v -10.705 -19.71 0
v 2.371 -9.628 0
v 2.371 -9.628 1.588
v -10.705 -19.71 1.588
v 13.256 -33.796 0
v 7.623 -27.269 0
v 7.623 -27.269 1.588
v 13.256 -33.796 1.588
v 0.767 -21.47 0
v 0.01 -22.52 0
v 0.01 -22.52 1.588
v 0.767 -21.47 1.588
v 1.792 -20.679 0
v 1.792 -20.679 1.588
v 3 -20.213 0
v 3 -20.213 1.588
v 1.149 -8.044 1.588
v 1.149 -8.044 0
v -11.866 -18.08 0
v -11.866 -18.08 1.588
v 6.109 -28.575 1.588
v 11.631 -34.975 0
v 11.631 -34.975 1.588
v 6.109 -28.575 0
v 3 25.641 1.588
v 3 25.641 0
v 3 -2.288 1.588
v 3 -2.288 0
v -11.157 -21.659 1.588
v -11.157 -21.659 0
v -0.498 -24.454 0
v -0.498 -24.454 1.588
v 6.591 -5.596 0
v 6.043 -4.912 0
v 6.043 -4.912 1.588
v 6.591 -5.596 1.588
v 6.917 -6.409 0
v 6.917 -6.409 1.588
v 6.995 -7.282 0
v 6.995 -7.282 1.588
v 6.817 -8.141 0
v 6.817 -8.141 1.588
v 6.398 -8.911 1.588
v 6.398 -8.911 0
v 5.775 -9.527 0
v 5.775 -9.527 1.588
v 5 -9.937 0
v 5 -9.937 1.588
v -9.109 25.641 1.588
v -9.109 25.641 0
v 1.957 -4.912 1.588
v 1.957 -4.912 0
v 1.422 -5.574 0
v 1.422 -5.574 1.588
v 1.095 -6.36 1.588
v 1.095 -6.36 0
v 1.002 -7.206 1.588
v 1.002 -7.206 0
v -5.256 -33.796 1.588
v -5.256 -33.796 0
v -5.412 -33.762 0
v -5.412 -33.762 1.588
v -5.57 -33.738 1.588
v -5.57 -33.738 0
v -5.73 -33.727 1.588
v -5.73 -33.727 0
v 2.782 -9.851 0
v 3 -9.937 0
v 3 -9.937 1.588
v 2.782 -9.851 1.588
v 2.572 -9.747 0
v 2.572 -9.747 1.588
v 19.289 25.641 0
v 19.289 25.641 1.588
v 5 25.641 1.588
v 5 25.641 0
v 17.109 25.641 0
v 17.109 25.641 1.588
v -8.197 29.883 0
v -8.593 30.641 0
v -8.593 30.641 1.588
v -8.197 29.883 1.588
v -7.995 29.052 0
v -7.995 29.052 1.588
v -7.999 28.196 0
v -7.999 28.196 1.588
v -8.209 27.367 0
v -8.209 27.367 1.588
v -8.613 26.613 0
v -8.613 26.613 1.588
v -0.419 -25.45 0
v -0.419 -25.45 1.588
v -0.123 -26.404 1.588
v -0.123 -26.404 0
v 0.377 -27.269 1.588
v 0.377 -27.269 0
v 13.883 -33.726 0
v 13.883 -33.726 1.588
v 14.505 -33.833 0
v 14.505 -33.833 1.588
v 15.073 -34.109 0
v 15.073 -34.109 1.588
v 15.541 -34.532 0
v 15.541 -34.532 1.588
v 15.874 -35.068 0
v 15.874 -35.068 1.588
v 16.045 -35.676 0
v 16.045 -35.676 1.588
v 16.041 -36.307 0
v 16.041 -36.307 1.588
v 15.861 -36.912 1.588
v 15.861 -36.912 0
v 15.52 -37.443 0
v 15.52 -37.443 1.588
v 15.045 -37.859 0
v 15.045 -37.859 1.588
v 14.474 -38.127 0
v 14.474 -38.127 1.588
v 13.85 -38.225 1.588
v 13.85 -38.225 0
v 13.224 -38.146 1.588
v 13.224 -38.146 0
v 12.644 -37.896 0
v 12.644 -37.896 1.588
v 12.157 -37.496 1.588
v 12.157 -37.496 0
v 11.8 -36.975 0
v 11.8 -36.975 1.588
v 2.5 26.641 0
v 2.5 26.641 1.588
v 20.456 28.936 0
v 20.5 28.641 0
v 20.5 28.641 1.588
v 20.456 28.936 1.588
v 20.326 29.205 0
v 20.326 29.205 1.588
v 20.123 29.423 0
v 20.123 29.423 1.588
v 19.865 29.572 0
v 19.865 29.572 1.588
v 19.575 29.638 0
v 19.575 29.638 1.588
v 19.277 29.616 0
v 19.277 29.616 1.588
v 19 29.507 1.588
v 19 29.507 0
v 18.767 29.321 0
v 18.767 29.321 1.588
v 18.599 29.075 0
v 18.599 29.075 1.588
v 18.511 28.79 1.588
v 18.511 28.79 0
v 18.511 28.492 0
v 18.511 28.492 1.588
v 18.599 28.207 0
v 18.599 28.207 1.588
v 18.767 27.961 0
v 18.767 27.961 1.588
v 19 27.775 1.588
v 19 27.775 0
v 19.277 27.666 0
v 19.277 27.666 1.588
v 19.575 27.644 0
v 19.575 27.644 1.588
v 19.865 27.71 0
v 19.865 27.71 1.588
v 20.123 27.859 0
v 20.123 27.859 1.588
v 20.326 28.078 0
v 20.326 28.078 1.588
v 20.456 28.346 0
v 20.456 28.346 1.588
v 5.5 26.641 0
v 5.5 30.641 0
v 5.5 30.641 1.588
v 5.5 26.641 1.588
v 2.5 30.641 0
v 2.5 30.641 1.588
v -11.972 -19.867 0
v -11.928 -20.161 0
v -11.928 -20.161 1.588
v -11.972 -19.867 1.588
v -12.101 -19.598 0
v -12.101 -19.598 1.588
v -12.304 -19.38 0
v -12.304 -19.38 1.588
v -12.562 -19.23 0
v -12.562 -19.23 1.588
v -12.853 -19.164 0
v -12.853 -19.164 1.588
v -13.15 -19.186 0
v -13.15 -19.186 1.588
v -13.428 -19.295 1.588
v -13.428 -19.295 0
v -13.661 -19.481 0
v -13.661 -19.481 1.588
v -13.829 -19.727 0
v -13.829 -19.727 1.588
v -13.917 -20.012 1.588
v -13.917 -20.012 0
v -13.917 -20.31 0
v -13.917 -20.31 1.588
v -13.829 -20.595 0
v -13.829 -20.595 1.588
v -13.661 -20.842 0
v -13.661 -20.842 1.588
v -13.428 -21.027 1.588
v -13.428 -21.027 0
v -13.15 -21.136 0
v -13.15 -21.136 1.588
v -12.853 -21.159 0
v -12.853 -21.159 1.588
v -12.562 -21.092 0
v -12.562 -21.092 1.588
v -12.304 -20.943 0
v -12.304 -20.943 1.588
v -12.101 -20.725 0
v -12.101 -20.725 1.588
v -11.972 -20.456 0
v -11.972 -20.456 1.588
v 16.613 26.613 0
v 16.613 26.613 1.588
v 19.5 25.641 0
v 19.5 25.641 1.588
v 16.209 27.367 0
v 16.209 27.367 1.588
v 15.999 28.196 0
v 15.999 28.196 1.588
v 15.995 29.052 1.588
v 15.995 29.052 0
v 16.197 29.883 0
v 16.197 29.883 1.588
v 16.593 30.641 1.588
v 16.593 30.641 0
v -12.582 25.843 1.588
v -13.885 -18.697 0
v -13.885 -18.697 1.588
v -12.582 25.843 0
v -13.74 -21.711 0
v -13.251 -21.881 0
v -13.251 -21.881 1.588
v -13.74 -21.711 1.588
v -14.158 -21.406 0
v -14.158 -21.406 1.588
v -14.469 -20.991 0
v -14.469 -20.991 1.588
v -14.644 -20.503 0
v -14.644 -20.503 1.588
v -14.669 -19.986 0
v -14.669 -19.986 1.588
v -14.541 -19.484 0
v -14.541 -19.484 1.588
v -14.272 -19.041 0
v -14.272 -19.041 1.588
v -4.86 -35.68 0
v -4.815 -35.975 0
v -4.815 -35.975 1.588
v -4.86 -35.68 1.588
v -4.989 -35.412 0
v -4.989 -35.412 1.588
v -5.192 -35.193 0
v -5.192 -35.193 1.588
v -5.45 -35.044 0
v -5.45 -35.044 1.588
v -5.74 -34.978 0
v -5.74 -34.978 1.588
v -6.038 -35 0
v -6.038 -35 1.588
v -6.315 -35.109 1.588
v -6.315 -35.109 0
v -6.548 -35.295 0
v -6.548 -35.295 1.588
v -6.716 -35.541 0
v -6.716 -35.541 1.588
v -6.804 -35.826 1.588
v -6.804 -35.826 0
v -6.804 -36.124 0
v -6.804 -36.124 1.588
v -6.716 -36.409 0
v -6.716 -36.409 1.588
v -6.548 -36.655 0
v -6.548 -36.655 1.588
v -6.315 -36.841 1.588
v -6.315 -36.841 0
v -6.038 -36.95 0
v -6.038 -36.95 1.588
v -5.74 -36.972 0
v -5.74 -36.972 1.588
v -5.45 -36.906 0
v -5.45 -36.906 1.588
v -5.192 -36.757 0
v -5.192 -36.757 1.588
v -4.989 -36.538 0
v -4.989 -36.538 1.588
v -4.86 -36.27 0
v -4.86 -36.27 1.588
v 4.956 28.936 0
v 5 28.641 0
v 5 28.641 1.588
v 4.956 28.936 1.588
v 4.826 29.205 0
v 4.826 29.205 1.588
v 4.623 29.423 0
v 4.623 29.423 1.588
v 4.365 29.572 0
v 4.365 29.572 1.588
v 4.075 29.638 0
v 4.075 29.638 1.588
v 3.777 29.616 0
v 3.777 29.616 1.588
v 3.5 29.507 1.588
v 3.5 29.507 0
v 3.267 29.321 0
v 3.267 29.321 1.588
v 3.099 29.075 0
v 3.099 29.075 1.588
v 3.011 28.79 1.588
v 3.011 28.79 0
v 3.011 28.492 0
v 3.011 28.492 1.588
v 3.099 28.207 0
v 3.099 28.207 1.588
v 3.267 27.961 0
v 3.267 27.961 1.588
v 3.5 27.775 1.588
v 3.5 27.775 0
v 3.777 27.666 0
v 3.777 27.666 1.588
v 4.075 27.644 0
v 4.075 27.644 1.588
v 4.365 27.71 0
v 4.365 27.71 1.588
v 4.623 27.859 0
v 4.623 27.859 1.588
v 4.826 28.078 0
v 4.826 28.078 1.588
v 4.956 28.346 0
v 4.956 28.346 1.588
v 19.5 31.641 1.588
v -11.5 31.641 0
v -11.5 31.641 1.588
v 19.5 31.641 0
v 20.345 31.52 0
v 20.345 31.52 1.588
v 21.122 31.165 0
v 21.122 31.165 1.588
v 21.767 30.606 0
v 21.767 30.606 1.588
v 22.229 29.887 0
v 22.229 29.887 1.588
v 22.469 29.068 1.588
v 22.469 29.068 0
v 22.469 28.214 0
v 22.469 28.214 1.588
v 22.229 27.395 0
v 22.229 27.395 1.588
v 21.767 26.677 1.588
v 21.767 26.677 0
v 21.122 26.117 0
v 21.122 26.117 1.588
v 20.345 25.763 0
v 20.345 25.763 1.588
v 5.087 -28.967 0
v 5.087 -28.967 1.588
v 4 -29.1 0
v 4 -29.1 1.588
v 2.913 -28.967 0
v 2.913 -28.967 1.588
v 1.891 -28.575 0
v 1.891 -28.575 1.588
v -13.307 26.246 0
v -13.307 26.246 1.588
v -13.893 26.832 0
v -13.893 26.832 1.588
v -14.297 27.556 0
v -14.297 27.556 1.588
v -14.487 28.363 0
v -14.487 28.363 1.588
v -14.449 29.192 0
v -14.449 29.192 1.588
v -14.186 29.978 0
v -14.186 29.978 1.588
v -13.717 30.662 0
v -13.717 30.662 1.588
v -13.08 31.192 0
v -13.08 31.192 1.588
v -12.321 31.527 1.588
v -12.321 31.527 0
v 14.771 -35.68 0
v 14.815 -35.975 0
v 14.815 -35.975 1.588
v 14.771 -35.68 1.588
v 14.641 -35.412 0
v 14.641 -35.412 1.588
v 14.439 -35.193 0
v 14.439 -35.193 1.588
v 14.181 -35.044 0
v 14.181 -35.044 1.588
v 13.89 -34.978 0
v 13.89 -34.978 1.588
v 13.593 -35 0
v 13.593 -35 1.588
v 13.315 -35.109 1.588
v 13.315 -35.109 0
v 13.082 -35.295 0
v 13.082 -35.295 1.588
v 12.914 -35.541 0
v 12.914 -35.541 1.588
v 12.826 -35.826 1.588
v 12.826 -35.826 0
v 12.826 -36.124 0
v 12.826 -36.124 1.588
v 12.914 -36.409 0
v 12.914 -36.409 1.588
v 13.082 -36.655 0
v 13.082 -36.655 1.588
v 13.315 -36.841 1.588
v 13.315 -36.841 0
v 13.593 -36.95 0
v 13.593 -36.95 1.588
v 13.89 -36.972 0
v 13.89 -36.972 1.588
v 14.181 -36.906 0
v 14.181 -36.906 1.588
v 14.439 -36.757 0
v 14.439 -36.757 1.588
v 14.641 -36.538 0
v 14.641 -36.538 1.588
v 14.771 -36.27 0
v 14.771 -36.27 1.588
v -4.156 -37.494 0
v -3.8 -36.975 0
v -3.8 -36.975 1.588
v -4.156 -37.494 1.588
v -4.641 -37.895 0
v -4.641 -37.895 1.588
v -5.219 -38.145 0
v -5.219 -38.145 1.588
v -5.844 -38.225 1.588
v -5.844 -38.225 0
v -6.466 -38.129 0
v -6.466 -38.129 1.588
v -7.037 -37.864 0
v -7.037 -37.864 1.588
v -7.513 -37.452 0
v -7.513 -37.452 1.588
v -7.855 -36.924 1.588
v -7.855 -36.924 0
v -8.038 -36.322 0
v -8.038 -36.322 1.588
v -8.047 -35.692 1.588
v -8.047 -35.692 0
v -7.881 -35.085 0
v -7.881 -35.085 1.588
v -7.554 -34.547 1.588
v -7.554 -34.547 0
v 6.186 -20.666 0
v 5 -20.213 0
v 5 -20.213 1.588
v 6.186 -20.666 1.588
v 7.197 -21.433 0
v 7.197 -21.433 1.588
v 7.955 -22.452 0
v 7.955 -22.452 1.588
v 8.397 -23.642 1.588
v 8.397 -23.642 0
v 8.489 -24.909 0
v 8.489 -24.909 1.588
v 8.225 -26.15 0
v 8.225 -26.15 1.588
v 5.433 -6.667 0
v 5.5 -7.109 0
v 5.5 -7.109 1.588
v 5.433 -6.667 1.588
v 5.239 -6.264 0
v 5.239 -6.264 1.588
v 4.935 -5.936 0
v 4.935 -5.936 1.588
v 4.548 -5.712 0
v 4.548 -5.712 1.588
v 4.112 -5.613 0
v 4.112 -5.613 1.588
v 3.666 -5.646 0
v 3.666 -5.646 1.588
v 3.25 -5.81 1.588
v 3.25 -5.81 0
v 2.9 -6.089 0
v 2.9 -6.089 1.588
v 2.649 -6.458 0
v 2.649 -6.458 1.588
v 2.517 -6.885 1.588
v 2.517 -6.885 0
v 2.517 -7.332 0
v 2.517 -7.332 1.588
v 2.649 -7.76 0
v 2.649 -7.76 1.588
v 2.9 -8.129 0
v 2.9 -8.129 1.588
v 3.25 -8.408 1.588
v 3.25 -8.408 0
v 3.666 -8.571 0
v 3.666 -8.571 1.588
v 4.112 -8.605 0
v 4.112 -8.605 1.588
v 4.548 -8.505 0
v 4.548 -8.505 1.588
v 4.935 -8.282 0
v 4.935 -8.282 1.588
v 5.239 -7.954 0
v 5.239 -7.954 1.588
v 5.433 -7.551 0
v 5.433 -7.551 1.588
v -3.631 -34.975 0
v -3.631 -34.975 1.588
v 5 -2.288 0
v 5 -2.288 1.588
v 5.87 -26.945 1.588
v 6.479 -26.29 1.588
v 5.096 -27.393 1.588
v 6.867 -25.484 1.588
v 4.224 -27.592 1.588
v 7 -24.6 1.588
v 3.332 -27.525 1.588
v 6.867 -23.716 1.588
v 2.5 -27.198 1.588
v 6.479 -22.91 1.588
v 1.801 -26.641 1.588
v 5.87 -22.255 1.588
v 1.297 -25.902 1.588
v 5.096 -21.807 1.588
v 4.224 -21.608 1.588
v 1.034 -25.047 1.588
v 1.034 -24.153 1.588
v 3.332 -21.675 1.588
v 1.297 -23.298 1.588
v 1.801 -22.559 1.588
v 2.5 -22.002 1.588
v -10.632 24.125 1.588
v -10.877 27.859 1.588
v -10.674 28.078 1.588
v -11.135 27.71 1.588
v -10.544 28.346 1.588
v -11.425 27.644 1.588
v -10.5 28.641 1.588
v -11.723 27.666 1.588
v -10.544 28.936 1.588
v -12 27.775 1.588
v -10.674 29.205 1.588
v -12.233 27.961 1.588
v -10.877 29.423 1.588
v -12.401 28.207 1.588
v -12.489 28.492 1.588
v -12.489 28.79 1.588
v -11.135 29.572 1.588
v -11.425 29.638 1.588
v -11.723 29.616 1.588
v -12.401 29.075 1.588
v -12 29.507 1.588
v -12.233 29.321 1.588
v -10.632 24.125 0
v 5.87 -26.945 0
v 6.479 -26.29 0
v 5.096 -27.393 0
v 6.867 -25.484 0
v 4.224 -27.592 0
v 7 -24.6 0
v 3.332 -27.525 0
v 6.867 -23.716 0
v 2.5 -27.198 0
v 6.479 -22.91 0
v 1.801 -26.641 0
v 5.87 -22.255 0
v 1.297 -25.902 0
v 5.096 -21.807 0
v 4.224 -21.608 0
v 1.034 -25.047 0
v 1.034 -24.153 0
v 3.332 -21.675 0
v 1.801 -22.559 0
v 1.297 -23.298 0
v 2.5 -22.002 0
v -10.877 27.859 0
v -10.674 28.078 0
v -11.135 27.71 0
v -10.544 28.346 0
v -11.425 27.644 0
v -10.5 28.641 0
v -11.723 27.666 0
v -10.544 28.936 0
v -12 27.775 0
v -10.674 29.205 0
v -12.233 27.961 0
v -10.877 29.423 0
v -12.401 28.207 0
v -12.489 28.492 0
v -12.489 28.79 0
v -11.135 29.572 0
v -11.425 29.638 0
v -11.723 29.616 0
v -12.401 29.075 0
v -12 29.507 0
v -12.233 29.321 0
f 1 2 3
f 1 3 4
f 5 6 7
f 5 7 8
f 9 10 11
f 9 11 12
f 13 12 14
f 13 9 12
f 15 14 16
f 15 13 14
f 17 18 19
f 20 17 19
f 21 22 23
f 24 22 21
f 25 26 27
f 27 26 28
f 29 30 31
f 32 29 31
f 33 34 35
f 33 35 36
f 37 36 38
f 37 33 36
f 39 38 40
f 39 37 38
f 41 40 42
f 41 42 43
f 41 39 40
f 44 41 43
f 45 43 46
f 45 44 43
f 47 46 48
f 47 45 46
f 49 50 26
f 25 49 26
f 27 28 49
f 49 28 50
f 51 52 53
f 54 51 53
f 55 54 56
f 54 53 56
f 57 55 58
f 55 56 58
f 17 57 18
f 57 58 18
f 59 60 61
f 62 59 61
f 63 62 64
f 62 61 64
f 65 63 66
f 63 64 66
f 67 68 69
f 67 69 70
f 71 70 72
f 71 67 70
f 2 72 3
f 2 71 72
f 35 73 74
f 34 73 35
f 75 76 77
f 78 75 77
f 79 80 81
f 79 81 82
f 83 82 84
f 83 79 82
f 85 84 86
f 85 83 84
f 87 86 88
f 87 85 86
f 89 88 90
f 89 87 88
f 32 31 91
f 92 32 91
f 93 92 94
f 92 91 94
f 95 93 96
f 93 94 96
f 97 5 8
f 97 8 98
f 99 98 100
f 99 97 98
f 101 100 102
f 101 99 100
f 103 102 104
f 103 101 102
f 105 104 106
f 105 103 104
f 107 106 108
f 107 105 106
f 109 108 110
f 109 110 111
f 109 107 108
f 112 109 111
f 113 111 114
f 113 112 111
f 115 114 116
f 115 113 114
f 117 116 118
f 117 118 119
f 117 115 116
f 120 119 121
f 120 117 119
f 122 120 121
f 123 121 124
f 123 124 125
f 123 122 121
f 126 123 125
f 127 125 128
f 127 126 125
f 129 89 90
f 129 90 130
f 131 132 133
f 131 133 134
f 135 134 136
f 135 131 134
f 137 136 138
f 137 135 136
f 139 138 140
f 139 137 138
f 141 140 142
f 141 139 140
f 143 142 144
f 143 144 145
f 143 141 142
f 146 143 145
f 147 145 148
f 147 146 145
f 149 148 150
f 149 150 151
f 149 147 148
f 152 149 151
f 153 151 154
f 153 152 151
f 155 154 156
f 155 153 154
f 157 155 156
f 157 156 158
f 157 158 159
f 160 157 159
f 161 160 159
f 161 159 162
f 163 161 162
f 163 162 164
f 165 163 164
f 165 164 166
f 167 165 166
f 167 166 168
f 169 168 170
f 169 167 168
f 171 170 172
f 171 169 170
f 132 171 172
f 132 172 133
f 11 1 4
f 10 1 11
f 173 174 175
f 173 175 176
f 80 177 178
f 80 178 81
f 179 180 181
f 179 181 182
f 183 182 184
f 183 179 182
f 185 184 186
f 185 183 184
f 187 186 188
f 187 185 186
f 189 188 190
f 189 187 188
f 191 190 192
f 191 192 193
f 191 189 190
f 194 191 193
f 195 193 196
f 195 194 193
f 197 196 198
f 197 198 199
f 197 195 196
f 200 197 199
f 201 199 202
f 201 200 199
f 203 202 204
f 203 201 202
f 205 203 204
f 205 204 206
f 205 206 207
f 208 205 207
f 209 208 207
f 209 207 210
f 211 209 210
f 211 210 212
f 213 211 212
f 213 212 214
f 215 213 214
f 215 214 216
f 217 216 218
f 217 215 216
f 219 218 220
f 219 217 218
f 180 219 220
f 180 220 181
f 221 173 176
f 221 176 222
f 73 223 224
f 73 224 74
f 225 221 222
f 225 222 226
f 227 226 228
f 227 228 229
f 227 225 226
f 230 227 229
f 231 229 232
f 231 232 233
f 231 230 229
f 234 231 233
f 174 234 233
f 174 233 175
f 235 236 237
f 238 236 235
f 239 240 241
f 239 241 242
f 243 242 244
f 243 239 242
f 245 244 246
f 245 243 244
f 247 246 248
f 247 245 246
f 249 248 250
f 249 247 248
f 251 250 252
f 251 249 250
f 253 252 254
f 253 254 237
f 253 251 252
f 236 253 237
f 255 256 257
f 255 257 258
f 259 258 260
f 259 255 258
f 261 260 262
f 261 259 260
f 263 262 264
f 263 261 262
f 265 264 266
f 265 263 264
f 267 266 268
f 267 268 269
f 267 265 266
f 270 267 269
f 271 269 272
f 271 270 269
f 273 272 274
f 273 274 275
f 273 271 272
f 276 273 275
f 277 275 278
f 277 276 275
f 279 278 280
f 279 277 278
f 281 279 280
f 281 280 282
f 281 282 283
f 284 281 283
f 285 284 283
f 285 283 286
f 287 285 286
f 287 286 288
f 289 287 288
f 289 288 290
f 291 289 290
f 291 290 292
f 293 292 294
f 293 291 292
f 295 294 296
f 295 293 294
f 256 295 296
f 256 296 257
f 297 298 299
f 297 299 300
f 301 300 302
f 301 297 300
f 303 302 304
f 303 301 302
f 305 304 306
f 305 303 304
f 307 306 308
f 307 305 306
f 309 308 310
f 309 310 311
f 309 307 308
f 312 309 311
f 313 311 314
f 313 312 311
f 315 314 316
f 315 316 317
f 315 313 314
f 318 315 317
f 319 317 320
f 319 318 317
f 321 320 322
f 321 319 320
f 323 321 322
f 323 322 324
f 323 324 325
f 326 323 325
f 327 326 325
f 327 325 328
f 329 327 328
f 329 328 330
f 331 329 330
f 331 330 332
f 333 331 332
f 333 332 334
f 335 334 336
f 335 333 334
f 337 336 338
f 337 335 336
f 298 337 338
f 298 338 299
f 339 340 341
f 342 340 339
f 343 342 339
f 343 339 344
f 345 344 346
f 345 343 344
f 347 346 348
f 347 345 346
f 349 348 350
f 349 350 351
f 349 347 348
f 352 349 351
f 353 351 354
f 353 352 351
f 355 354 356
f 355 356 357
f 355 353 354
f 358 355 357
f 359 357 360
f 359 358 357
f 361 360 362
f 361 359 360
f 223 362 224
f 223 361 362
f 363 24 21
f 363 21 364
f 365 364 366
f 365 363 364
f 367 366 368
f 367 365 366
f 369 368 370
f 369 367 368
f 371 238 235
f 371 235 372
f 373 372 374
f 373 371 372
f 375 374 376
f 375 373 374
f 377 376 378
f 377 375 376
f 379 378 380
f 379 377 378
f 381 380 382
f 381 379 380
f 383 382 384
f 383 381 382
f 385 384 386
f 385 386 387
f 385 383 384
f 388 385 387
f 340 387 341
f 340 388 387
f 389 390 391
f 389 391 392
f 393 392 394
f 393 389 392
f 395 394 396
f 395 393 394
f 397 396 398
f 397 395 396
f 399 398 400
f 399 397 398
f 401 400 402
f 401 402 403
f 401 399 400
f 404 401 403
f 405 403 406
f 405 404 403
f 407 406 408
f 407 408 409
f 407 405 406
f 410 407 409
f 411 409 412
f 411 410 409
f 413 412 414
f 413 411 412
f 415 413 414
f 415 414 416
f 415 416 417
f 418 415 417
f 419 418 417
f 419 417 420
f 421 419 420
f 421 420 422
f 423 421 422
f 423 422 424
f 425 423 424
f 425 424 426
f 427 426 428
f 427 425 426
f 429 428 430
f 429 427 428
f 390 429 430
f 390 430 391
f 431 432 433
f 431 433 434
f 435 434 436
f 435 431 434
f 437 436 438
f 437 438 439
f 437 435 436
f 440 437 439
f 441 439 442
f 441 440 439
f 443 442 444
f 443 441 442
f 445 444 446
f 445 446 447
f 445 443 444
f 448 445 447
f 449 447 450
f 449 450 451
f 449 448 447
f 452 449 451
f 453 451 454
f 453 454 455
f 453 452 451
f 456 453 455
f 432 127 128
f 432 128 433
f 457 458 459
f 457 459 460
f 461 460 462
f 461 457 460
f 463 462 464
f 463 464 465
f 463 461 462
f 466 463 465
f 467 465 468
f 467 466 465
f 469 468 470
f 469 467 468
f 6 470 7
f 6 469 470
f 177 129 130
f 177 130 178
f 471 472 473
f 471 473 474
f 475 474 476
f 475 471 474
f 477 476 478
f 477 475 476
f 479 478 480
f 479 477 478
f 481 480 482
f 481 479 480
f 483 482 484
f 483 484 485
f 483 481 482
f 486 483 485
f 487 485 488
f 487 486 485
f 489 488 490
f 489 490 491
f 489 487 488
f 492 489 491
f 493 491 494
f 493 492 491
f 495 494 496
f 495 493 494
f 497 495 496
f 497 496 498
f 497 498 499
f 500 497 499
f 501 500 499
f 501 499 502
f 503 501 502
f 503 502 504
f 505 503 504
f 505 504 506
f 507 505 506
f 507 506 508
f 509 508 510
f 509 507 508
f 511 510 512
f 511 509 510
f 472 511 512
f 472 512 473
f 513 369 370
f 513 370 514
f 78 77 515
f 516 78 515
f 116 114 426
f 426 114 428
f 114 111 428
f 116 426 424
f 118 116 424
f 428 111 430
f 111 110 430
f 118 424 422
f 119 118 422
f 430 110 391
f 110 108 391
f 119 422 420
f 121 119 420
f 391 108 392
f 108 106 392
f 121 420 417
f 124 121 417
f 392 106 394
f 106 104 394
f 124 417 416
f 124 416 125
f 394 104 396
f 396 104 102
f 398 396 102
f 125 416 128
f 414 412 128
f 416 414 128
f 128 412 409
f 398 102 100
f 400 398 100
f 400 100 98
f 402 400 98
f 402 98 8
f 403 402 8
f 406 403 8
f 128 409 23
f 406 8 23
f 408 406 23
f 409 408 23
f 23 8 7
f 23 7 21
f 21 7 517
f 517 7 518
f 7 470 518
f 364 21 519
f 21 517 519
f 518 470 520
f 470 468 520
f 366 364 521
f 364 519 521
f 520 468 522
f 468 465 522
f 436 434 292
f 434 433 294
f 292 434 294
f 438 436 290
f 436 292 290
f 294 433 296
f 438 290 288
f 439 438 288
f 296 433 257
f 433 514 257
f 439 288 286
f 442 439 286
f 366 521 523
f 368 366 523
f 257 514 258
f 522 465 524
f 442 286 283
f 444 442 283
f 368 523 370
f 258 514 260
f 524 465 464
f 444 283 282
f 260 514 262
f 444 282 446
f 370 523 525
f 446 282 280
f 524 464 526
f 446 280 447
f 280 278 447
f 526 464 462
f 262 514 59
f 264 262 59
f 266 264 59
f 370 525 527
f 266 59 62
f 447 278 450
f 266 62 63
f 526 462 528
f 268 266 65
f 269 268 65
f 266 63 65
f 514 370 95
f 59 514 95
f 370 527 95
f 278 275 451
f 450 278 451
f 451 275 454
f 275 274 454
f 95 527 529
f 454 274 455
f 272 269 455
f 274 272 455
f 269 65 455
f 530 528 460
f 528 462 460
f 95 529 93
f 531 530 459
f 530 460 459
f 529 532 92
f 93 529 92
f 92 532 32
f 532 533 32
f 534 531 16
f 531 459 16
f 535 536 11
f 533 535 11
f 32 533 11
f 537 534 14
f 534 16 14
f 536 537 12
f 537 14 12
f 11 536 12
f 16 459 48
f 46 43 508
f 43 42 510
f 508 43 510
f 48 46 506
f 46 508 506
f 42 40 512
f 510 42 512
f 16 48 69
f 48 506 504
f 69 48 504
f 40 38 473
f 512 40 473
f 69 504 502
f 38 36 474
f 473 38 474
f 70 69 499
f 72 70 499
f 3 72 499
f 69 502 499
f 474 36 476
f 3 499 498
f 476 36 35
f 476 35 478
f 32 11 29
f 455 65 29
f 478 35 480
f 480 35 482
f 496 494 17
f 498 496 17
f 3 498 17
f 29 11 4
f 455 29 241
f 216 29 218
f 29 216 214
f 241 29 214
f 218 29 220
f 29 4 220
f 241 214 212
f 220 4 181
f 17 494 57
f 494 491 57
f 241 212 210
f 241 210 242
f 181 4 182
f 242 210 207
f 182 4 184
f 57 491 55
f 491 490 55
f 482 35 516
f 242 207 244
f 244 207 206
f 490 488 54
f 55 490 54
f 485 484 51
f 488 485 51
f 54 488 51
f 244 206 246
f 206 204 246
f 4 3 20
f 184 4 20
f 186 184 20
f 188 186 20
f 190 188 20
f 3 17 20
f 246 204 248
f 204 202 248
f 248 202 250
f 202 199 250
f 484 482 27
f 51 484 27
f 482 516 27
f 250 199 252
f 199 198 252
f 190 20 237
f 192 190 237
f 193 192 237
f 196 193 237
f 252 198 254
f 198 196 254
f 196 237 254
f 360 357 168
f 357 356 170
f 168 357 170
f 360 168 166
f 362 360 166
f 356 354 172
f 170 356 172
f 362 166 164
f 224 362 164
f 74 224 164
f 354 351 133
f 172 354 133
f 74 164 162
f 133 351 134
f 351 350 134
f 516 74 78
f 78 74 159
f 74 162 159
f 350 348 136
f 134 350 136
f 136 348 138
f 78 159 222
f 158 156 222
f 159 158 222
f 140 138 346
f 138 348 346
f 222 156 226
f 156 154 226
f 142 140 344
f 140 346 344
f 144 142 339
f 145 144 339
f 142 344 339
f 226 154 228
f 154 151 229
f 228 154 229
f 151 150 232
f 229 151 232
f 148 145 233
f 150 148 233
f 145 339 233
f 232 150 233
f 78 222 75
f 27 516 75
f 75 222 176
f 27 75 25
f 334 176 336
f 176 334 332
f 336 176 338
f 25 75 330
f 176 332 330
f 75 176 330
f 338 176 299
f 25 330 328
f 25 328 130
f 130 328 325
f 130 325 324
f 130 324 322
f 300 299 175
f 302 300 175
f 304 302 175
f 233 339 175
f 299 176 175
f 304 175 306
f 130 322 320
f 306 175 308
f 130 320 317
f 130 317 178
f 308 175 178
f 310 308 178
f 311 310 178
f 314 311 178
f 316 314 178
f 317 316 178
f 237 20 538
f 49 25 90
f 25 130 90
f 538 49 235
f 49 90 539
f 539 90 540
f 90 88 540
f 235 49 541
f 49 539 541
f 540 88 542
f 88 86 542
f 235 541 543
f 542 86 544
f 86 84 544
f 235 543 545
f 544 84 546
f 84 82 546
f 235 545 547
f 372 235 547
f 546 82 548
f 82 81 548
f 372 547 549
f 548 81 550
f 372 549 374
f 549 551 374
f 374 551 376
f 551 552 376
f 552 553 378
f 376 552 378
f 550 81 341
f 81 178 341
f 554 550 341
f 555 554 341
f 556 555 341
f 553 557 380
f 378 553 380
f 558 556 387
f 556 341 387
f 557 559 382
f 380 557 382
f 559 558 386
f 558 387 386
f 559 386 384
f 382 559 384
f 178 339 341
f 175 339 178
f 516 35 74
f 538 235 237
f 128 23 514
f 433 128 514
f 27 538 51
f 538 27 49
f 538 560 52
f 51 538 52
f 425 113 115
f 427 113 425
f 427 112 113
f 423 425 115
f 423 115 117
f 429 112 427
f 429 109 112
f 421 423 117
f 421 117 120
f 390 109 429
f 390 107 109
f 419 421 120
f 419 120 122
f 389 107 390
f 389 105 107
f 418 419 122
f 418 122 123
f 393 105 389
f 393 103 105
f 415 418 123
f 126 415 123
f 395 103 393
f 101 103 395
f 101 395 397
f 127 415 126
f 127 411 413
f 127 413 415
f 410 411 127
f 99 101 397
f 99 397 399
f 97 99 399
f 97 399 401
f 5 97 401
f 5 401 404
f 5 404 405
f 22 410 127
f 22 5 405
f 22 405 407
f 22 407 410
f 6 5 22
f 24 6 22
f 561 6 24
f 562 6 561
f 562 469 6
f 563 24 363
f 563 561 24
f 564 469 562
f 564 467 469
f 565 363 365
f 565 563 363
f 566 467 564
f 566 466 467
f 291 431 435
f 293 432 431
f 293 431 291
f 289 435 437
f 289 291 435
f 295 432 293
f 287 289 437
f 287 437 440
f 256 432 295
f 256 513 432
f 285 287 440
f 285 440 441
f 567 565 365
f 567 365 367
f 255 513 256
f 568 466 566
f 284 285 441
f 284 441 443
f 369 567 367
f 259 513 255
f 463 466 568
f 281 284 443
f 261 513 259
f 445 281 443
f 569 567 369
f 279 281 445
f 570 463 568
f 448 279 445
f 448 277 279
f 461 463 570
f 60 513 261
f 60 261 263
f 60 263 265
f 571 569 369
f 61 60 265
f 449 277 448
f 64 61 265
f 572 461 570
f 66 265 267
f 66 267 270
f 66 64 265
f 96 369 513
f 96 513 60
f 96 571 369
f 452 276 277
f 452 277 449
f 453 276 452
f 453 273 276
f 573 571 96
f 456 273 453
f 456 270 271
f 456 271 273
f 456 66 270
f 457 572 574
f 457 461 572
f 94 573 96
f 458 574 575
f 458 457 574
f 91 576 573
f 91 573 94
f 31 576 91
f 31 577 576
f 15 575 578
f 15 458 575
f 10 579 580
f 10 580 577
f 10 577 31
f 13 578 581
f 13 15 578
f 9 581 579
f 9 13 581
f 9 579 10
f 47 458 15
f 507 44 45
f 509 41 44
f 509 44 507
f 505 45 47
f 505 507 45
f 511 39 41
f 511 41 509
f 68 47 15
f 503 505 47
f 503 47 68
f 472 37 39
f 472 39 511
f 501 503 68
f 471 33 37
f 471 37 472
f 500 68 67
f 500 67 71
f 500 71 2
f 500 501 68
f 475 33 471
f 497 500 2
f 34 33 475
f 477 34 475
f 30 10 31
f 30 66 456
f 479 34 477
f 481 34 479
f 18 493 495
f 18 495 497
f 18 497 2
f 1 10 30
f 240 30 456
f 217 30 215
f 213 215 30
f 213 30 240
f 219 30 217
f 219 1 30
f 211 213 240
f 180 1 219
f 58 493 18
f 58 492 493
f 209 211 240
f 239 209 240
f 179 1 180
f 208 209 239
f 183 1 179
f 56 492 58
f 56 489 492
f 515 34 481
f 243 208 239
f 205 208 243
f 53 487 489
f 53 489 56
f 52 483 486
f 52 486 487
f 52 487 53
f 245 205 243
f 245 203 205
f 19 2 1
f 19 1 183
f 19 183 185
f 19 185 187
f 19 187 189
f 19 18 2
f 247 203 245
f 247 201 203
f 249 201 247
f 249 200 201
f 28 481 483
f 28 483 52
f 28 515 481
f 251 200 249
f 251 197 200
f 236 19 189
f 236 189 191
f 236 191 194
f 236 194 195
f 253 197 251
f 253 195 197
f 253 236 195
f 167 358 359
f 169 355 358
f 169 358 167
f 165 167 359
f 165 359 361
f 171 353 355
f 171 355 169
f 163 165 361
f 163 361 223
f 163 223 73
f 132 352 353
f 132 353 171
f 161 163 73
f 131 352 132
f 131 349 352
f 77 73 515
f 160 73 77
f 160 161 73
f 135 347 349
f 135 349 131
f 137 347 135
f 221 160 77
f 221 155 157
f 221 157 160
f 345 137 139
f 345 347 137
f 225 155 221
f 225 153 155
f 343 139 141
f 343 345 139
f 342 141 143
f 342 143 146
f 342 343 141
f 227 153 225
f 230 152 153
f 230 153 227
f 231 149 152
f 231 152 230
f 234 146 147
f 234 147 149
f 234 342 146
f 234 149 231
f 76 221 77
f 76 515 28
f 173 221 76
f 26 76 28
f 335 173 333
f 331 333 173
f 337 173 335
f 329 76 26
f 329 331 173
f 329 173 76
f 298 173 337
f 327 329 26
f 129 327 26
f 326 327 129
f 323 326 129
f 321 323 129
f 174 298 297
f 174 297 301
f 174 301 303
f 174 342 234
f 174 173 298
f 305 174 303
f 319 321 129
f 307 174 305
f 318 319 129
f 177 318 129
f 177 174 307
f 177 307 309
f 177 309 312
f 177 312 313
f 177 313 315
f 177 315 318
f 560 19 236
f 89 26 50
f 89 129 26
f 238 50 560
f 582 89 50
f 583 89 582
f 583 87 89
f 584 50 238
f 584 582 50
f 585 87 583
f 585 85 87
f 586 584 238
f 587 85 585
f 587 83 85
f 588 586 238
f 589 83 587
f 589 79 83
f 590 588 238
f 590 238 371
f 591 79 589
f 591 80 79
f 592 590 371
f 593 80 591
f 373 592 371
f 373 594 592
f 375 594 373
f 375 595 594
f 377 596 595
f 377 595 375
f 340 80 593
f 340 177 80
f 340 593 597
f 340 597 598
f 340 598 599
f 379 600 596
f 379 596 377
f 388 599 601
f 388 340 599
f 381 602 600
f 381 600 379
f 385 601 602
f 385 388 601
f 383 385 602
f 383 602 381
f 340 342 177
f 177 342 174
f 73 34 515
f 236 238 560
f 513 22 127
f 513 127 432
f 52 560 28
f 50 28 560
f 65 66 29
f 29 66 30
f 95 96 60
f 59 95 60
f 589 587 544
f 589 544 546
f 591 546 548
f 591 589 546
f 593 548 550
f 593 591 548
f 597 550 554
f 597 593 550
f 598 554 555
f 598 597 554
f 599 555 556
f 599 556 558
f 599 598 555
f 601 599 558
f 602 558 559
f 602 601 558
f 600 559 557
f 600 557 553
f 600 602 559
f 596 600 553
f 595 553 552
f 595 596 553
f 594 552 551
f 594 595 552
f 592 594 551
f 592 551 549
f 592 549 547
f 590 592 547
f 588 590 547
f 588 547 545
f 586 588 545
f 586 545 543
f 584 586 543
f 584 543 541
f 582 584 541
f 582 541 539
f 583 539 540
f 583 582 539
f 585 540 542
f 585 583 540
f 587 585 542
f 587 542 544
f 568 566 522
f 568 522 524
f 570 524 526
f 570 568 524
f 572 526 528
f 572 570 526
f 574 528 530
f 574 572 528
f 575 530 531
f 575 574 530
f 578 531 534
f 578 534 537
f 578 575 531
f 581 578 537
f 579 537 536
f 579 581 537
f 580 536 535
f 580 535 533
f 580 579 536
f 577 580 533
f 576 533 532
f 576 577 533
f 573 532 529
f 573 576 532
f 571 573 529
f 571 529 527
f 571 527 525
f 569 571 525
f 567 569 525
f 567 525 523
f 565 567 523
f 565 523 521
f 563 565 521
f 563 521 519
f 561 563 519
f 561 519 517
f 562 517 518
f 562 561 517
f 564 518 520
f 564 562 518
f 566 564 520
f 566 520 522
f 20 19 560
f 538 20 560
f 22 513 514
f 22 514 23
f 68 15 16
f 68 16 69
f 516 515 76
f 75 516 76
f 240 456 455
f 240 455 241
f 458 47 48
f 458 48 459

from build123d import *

# Parameters (mm, degrees)
SKETCH3_R           = 3
SKETCH3_R_2         = 1
SKETCH3_R_3         = 1.500000001
BOSS_EXTRUDE1_DEPTH = 1.5875


with BuildPart() as part:
    # Sketch3 → Boss-Extrude1 (new body)
    with BuildSketch(Plane.XY):
        with BuildLine():
            Line((-11.499999999, 31.641209076), (19.500000007, 31.641209076))
            ThreePointArc((19.500000007, 31.641209076), (22.500000018, 28.641209065), (19.500000007, 25.641209053))
            Line((19.500000007, 25.641209053), (19.289245586, 25.641209053))
            Line((19.289245586, 25.641209053), (6.042590494, -4.911559932))
            ThreePointArc((6.042590494, -4.911559932), (6.937456234, -7.718176584), (5, -9.937218057))
            Line((5, -9.937218057), (5, -20.212517806))
            ThreePointArc((5, -20.212517806), (8.217909302, -23.031803227), (7.623388784, -27.268530255))
            Line((7.623388784, -27.268530255), (13.255537043, -33.795798194))
            ThreePointArc((13.255537043, -33.795798194), (15.860860714, -36.911906153), (11.799598856, -36.975091304))
            Line((11.799598856, -36.975091304), (-3.799598854, -36.975091304))
            ThreePointArc((-3.799598854, -36.975091304), (-7.037028015, -37.86441568), (-7.553929711, -34.547088736))
            Line((-7.553929711, -34.547088736), (-13.250643923, -21.881287835))
            ThreePointArc((-13.250643923, -21.881287835), (-14.64398835, -20.503360892), (-13.885312196, -18.696567642))
            Line((-13.885312196, -18.696567642), (-12.58228364, 25.843234412))
            ThreePointArc((-12.58228364, 25.843234412), (-14.449061209, 29.191697969), (-11.499999999, 31.641209076))
        make_face()
        with Locations((4, -24.6)):
            Circle(SKETCH3_R, mode=Mode.SUBTRACT)
        with Locations((-12.927736724, -20.161336981)):
            Circle(SKETCH3_R_2, mode=Mode.SUBTRACT)
        with Locations((4, -7.108790933)):
            Circle(SKETCH3_R_3, mode=Mode.SUBTRACT)
        with Locations((-5.815163291, -35.975091304)):
            Circle(SKETCH3_R_2, mode=Mode.SUBTRACT)
        with Locations((13.815163293, -35.975091304)):
            Circle(SKETCH3_R_2, mode=Mode.SUBTRACT)
        with Locations((-11.499999999, 28.641209067)):
            Circle(SKETCH3_R_2, mode=Mode.SUBTRACT)
        with Locations((4, 28.641209067)):
            Circle(SKETCH3_R_2, mode=Mode.SUBTRACT)
        with Locations((19.500000007, 28.641209065)):
            Circle(SKETCH3_R_2, mode=Mode.SUBTRACT)
        Polygon((-9.109355809, 25.641209053), (3, 25.641209053), (3, -2.288434183), align=None, mode=Mode.SUBTRACT)
        with BuildLine():
            Line((5.500000007, 30.641209065), (5.500000007, 26.641209065))
            Line((5.500000007, 26.641209065), (16.612506499, 26.612956076))
            ThreePointArc((16.612506499, 26.612956076), (15.971383713, 28.624004515), (16.59286586, 30.641209065))
            Line((16.59286586, 30.641209065), (5.500000007, 30.641209065))
        make_face(mode=Mode.SUBTRACT)
        with BuildLine():
            Line((2.500000001, 30.641209067), (-8.592865852, 30.641209067))
            ThreePointArc((-8.592865852, 30.641209067), (-7.971383705, 28.624004518), (-8.612506491, 26.612956078))
            Line((-8.612506491, 26.612956078), (2.500000001, 26.641209067))
            Line((2.500000001, 26.641209067), (2.500000001, 30.641209067))
        make_face(mode=Mode.SUBTRACT)
        with BuildLine():
            Line((3, -20.212517806), (3, -9.937218057))
            ThreePointArc((3, -9.937218057), (2.676302312, -9.800969313), (2.370745742, -9.627824589))
            Line((2.370745742, -9.627824589), (-10.705156103, -19.710319003))
            Line((-10.705156103, -19.710319003), (0.009629689, -22.519869047))
            ThreePointArc((0.009629689, -22.519869047), (1.251015388, -21.03726459), (3, -20.212517806))
        make_face(mode=Mode.SUBTRACT)
        Polygon((5, 25.641209053), (17.109355816, 25.641209053), (5, -2.288434184), align=None, mode=Mode.SUBTRACT)
        with BuildLine():
            Line((1.149490439, -8.043988902), (-11.866425305, -18.080229562))
            Line((-11.866425305, -18.080229562), (-10.631706445, 24.124626881))
            Line((-10.631706445, 24.124626881), (1.957409506, -4.911559931))
            ThreePointArc((1.957409506, -4.911559931), (1.095067152, -6.359547882), (1.149490439, -8.043988902))
        make_face(mode=Mode.SUBTRACT)
        with BuildLine():
            Line((-3.631490152, -34.975091304), (11.631490154, -34.975091304))
            Line((11.631490154, -34.975091304), (6.109164807, -28.575100479))
            ThreePointArc((6.109164807, -28.575100479), (4, -29.1), (1.890835193, -28.575100479))
            Line((1.890835193, -28.575100479), (-3.631490152, -34.975091304))
        make_face(mode=Mode.SUBTRACT)
        with BuildLine():
            Line((-11.157493782, -21.659322937), (-0.497646084, -24.454467529))
            ThreePointArc((-0.497646084, -24.454467529), (-0.297387472, -25.935088354), (0.376611216, -27.268530255))
            Line((0.376611216, -27.268530255), (-5.255537041, -33.795798194))
            ThreePointArc((-5.255537041, -33.795798194), (-5.490888453, -33.748581518), (-5.729930654, -33.72670624))
            Line((-5.729930654, -33.72670624), (-11.157493782, -21.659322937))
        make_face(mode=Mode.SUBTRACT)
    extrude(amount=BOSS_EXTRUDE1_DEPTH)


solid = part.part
